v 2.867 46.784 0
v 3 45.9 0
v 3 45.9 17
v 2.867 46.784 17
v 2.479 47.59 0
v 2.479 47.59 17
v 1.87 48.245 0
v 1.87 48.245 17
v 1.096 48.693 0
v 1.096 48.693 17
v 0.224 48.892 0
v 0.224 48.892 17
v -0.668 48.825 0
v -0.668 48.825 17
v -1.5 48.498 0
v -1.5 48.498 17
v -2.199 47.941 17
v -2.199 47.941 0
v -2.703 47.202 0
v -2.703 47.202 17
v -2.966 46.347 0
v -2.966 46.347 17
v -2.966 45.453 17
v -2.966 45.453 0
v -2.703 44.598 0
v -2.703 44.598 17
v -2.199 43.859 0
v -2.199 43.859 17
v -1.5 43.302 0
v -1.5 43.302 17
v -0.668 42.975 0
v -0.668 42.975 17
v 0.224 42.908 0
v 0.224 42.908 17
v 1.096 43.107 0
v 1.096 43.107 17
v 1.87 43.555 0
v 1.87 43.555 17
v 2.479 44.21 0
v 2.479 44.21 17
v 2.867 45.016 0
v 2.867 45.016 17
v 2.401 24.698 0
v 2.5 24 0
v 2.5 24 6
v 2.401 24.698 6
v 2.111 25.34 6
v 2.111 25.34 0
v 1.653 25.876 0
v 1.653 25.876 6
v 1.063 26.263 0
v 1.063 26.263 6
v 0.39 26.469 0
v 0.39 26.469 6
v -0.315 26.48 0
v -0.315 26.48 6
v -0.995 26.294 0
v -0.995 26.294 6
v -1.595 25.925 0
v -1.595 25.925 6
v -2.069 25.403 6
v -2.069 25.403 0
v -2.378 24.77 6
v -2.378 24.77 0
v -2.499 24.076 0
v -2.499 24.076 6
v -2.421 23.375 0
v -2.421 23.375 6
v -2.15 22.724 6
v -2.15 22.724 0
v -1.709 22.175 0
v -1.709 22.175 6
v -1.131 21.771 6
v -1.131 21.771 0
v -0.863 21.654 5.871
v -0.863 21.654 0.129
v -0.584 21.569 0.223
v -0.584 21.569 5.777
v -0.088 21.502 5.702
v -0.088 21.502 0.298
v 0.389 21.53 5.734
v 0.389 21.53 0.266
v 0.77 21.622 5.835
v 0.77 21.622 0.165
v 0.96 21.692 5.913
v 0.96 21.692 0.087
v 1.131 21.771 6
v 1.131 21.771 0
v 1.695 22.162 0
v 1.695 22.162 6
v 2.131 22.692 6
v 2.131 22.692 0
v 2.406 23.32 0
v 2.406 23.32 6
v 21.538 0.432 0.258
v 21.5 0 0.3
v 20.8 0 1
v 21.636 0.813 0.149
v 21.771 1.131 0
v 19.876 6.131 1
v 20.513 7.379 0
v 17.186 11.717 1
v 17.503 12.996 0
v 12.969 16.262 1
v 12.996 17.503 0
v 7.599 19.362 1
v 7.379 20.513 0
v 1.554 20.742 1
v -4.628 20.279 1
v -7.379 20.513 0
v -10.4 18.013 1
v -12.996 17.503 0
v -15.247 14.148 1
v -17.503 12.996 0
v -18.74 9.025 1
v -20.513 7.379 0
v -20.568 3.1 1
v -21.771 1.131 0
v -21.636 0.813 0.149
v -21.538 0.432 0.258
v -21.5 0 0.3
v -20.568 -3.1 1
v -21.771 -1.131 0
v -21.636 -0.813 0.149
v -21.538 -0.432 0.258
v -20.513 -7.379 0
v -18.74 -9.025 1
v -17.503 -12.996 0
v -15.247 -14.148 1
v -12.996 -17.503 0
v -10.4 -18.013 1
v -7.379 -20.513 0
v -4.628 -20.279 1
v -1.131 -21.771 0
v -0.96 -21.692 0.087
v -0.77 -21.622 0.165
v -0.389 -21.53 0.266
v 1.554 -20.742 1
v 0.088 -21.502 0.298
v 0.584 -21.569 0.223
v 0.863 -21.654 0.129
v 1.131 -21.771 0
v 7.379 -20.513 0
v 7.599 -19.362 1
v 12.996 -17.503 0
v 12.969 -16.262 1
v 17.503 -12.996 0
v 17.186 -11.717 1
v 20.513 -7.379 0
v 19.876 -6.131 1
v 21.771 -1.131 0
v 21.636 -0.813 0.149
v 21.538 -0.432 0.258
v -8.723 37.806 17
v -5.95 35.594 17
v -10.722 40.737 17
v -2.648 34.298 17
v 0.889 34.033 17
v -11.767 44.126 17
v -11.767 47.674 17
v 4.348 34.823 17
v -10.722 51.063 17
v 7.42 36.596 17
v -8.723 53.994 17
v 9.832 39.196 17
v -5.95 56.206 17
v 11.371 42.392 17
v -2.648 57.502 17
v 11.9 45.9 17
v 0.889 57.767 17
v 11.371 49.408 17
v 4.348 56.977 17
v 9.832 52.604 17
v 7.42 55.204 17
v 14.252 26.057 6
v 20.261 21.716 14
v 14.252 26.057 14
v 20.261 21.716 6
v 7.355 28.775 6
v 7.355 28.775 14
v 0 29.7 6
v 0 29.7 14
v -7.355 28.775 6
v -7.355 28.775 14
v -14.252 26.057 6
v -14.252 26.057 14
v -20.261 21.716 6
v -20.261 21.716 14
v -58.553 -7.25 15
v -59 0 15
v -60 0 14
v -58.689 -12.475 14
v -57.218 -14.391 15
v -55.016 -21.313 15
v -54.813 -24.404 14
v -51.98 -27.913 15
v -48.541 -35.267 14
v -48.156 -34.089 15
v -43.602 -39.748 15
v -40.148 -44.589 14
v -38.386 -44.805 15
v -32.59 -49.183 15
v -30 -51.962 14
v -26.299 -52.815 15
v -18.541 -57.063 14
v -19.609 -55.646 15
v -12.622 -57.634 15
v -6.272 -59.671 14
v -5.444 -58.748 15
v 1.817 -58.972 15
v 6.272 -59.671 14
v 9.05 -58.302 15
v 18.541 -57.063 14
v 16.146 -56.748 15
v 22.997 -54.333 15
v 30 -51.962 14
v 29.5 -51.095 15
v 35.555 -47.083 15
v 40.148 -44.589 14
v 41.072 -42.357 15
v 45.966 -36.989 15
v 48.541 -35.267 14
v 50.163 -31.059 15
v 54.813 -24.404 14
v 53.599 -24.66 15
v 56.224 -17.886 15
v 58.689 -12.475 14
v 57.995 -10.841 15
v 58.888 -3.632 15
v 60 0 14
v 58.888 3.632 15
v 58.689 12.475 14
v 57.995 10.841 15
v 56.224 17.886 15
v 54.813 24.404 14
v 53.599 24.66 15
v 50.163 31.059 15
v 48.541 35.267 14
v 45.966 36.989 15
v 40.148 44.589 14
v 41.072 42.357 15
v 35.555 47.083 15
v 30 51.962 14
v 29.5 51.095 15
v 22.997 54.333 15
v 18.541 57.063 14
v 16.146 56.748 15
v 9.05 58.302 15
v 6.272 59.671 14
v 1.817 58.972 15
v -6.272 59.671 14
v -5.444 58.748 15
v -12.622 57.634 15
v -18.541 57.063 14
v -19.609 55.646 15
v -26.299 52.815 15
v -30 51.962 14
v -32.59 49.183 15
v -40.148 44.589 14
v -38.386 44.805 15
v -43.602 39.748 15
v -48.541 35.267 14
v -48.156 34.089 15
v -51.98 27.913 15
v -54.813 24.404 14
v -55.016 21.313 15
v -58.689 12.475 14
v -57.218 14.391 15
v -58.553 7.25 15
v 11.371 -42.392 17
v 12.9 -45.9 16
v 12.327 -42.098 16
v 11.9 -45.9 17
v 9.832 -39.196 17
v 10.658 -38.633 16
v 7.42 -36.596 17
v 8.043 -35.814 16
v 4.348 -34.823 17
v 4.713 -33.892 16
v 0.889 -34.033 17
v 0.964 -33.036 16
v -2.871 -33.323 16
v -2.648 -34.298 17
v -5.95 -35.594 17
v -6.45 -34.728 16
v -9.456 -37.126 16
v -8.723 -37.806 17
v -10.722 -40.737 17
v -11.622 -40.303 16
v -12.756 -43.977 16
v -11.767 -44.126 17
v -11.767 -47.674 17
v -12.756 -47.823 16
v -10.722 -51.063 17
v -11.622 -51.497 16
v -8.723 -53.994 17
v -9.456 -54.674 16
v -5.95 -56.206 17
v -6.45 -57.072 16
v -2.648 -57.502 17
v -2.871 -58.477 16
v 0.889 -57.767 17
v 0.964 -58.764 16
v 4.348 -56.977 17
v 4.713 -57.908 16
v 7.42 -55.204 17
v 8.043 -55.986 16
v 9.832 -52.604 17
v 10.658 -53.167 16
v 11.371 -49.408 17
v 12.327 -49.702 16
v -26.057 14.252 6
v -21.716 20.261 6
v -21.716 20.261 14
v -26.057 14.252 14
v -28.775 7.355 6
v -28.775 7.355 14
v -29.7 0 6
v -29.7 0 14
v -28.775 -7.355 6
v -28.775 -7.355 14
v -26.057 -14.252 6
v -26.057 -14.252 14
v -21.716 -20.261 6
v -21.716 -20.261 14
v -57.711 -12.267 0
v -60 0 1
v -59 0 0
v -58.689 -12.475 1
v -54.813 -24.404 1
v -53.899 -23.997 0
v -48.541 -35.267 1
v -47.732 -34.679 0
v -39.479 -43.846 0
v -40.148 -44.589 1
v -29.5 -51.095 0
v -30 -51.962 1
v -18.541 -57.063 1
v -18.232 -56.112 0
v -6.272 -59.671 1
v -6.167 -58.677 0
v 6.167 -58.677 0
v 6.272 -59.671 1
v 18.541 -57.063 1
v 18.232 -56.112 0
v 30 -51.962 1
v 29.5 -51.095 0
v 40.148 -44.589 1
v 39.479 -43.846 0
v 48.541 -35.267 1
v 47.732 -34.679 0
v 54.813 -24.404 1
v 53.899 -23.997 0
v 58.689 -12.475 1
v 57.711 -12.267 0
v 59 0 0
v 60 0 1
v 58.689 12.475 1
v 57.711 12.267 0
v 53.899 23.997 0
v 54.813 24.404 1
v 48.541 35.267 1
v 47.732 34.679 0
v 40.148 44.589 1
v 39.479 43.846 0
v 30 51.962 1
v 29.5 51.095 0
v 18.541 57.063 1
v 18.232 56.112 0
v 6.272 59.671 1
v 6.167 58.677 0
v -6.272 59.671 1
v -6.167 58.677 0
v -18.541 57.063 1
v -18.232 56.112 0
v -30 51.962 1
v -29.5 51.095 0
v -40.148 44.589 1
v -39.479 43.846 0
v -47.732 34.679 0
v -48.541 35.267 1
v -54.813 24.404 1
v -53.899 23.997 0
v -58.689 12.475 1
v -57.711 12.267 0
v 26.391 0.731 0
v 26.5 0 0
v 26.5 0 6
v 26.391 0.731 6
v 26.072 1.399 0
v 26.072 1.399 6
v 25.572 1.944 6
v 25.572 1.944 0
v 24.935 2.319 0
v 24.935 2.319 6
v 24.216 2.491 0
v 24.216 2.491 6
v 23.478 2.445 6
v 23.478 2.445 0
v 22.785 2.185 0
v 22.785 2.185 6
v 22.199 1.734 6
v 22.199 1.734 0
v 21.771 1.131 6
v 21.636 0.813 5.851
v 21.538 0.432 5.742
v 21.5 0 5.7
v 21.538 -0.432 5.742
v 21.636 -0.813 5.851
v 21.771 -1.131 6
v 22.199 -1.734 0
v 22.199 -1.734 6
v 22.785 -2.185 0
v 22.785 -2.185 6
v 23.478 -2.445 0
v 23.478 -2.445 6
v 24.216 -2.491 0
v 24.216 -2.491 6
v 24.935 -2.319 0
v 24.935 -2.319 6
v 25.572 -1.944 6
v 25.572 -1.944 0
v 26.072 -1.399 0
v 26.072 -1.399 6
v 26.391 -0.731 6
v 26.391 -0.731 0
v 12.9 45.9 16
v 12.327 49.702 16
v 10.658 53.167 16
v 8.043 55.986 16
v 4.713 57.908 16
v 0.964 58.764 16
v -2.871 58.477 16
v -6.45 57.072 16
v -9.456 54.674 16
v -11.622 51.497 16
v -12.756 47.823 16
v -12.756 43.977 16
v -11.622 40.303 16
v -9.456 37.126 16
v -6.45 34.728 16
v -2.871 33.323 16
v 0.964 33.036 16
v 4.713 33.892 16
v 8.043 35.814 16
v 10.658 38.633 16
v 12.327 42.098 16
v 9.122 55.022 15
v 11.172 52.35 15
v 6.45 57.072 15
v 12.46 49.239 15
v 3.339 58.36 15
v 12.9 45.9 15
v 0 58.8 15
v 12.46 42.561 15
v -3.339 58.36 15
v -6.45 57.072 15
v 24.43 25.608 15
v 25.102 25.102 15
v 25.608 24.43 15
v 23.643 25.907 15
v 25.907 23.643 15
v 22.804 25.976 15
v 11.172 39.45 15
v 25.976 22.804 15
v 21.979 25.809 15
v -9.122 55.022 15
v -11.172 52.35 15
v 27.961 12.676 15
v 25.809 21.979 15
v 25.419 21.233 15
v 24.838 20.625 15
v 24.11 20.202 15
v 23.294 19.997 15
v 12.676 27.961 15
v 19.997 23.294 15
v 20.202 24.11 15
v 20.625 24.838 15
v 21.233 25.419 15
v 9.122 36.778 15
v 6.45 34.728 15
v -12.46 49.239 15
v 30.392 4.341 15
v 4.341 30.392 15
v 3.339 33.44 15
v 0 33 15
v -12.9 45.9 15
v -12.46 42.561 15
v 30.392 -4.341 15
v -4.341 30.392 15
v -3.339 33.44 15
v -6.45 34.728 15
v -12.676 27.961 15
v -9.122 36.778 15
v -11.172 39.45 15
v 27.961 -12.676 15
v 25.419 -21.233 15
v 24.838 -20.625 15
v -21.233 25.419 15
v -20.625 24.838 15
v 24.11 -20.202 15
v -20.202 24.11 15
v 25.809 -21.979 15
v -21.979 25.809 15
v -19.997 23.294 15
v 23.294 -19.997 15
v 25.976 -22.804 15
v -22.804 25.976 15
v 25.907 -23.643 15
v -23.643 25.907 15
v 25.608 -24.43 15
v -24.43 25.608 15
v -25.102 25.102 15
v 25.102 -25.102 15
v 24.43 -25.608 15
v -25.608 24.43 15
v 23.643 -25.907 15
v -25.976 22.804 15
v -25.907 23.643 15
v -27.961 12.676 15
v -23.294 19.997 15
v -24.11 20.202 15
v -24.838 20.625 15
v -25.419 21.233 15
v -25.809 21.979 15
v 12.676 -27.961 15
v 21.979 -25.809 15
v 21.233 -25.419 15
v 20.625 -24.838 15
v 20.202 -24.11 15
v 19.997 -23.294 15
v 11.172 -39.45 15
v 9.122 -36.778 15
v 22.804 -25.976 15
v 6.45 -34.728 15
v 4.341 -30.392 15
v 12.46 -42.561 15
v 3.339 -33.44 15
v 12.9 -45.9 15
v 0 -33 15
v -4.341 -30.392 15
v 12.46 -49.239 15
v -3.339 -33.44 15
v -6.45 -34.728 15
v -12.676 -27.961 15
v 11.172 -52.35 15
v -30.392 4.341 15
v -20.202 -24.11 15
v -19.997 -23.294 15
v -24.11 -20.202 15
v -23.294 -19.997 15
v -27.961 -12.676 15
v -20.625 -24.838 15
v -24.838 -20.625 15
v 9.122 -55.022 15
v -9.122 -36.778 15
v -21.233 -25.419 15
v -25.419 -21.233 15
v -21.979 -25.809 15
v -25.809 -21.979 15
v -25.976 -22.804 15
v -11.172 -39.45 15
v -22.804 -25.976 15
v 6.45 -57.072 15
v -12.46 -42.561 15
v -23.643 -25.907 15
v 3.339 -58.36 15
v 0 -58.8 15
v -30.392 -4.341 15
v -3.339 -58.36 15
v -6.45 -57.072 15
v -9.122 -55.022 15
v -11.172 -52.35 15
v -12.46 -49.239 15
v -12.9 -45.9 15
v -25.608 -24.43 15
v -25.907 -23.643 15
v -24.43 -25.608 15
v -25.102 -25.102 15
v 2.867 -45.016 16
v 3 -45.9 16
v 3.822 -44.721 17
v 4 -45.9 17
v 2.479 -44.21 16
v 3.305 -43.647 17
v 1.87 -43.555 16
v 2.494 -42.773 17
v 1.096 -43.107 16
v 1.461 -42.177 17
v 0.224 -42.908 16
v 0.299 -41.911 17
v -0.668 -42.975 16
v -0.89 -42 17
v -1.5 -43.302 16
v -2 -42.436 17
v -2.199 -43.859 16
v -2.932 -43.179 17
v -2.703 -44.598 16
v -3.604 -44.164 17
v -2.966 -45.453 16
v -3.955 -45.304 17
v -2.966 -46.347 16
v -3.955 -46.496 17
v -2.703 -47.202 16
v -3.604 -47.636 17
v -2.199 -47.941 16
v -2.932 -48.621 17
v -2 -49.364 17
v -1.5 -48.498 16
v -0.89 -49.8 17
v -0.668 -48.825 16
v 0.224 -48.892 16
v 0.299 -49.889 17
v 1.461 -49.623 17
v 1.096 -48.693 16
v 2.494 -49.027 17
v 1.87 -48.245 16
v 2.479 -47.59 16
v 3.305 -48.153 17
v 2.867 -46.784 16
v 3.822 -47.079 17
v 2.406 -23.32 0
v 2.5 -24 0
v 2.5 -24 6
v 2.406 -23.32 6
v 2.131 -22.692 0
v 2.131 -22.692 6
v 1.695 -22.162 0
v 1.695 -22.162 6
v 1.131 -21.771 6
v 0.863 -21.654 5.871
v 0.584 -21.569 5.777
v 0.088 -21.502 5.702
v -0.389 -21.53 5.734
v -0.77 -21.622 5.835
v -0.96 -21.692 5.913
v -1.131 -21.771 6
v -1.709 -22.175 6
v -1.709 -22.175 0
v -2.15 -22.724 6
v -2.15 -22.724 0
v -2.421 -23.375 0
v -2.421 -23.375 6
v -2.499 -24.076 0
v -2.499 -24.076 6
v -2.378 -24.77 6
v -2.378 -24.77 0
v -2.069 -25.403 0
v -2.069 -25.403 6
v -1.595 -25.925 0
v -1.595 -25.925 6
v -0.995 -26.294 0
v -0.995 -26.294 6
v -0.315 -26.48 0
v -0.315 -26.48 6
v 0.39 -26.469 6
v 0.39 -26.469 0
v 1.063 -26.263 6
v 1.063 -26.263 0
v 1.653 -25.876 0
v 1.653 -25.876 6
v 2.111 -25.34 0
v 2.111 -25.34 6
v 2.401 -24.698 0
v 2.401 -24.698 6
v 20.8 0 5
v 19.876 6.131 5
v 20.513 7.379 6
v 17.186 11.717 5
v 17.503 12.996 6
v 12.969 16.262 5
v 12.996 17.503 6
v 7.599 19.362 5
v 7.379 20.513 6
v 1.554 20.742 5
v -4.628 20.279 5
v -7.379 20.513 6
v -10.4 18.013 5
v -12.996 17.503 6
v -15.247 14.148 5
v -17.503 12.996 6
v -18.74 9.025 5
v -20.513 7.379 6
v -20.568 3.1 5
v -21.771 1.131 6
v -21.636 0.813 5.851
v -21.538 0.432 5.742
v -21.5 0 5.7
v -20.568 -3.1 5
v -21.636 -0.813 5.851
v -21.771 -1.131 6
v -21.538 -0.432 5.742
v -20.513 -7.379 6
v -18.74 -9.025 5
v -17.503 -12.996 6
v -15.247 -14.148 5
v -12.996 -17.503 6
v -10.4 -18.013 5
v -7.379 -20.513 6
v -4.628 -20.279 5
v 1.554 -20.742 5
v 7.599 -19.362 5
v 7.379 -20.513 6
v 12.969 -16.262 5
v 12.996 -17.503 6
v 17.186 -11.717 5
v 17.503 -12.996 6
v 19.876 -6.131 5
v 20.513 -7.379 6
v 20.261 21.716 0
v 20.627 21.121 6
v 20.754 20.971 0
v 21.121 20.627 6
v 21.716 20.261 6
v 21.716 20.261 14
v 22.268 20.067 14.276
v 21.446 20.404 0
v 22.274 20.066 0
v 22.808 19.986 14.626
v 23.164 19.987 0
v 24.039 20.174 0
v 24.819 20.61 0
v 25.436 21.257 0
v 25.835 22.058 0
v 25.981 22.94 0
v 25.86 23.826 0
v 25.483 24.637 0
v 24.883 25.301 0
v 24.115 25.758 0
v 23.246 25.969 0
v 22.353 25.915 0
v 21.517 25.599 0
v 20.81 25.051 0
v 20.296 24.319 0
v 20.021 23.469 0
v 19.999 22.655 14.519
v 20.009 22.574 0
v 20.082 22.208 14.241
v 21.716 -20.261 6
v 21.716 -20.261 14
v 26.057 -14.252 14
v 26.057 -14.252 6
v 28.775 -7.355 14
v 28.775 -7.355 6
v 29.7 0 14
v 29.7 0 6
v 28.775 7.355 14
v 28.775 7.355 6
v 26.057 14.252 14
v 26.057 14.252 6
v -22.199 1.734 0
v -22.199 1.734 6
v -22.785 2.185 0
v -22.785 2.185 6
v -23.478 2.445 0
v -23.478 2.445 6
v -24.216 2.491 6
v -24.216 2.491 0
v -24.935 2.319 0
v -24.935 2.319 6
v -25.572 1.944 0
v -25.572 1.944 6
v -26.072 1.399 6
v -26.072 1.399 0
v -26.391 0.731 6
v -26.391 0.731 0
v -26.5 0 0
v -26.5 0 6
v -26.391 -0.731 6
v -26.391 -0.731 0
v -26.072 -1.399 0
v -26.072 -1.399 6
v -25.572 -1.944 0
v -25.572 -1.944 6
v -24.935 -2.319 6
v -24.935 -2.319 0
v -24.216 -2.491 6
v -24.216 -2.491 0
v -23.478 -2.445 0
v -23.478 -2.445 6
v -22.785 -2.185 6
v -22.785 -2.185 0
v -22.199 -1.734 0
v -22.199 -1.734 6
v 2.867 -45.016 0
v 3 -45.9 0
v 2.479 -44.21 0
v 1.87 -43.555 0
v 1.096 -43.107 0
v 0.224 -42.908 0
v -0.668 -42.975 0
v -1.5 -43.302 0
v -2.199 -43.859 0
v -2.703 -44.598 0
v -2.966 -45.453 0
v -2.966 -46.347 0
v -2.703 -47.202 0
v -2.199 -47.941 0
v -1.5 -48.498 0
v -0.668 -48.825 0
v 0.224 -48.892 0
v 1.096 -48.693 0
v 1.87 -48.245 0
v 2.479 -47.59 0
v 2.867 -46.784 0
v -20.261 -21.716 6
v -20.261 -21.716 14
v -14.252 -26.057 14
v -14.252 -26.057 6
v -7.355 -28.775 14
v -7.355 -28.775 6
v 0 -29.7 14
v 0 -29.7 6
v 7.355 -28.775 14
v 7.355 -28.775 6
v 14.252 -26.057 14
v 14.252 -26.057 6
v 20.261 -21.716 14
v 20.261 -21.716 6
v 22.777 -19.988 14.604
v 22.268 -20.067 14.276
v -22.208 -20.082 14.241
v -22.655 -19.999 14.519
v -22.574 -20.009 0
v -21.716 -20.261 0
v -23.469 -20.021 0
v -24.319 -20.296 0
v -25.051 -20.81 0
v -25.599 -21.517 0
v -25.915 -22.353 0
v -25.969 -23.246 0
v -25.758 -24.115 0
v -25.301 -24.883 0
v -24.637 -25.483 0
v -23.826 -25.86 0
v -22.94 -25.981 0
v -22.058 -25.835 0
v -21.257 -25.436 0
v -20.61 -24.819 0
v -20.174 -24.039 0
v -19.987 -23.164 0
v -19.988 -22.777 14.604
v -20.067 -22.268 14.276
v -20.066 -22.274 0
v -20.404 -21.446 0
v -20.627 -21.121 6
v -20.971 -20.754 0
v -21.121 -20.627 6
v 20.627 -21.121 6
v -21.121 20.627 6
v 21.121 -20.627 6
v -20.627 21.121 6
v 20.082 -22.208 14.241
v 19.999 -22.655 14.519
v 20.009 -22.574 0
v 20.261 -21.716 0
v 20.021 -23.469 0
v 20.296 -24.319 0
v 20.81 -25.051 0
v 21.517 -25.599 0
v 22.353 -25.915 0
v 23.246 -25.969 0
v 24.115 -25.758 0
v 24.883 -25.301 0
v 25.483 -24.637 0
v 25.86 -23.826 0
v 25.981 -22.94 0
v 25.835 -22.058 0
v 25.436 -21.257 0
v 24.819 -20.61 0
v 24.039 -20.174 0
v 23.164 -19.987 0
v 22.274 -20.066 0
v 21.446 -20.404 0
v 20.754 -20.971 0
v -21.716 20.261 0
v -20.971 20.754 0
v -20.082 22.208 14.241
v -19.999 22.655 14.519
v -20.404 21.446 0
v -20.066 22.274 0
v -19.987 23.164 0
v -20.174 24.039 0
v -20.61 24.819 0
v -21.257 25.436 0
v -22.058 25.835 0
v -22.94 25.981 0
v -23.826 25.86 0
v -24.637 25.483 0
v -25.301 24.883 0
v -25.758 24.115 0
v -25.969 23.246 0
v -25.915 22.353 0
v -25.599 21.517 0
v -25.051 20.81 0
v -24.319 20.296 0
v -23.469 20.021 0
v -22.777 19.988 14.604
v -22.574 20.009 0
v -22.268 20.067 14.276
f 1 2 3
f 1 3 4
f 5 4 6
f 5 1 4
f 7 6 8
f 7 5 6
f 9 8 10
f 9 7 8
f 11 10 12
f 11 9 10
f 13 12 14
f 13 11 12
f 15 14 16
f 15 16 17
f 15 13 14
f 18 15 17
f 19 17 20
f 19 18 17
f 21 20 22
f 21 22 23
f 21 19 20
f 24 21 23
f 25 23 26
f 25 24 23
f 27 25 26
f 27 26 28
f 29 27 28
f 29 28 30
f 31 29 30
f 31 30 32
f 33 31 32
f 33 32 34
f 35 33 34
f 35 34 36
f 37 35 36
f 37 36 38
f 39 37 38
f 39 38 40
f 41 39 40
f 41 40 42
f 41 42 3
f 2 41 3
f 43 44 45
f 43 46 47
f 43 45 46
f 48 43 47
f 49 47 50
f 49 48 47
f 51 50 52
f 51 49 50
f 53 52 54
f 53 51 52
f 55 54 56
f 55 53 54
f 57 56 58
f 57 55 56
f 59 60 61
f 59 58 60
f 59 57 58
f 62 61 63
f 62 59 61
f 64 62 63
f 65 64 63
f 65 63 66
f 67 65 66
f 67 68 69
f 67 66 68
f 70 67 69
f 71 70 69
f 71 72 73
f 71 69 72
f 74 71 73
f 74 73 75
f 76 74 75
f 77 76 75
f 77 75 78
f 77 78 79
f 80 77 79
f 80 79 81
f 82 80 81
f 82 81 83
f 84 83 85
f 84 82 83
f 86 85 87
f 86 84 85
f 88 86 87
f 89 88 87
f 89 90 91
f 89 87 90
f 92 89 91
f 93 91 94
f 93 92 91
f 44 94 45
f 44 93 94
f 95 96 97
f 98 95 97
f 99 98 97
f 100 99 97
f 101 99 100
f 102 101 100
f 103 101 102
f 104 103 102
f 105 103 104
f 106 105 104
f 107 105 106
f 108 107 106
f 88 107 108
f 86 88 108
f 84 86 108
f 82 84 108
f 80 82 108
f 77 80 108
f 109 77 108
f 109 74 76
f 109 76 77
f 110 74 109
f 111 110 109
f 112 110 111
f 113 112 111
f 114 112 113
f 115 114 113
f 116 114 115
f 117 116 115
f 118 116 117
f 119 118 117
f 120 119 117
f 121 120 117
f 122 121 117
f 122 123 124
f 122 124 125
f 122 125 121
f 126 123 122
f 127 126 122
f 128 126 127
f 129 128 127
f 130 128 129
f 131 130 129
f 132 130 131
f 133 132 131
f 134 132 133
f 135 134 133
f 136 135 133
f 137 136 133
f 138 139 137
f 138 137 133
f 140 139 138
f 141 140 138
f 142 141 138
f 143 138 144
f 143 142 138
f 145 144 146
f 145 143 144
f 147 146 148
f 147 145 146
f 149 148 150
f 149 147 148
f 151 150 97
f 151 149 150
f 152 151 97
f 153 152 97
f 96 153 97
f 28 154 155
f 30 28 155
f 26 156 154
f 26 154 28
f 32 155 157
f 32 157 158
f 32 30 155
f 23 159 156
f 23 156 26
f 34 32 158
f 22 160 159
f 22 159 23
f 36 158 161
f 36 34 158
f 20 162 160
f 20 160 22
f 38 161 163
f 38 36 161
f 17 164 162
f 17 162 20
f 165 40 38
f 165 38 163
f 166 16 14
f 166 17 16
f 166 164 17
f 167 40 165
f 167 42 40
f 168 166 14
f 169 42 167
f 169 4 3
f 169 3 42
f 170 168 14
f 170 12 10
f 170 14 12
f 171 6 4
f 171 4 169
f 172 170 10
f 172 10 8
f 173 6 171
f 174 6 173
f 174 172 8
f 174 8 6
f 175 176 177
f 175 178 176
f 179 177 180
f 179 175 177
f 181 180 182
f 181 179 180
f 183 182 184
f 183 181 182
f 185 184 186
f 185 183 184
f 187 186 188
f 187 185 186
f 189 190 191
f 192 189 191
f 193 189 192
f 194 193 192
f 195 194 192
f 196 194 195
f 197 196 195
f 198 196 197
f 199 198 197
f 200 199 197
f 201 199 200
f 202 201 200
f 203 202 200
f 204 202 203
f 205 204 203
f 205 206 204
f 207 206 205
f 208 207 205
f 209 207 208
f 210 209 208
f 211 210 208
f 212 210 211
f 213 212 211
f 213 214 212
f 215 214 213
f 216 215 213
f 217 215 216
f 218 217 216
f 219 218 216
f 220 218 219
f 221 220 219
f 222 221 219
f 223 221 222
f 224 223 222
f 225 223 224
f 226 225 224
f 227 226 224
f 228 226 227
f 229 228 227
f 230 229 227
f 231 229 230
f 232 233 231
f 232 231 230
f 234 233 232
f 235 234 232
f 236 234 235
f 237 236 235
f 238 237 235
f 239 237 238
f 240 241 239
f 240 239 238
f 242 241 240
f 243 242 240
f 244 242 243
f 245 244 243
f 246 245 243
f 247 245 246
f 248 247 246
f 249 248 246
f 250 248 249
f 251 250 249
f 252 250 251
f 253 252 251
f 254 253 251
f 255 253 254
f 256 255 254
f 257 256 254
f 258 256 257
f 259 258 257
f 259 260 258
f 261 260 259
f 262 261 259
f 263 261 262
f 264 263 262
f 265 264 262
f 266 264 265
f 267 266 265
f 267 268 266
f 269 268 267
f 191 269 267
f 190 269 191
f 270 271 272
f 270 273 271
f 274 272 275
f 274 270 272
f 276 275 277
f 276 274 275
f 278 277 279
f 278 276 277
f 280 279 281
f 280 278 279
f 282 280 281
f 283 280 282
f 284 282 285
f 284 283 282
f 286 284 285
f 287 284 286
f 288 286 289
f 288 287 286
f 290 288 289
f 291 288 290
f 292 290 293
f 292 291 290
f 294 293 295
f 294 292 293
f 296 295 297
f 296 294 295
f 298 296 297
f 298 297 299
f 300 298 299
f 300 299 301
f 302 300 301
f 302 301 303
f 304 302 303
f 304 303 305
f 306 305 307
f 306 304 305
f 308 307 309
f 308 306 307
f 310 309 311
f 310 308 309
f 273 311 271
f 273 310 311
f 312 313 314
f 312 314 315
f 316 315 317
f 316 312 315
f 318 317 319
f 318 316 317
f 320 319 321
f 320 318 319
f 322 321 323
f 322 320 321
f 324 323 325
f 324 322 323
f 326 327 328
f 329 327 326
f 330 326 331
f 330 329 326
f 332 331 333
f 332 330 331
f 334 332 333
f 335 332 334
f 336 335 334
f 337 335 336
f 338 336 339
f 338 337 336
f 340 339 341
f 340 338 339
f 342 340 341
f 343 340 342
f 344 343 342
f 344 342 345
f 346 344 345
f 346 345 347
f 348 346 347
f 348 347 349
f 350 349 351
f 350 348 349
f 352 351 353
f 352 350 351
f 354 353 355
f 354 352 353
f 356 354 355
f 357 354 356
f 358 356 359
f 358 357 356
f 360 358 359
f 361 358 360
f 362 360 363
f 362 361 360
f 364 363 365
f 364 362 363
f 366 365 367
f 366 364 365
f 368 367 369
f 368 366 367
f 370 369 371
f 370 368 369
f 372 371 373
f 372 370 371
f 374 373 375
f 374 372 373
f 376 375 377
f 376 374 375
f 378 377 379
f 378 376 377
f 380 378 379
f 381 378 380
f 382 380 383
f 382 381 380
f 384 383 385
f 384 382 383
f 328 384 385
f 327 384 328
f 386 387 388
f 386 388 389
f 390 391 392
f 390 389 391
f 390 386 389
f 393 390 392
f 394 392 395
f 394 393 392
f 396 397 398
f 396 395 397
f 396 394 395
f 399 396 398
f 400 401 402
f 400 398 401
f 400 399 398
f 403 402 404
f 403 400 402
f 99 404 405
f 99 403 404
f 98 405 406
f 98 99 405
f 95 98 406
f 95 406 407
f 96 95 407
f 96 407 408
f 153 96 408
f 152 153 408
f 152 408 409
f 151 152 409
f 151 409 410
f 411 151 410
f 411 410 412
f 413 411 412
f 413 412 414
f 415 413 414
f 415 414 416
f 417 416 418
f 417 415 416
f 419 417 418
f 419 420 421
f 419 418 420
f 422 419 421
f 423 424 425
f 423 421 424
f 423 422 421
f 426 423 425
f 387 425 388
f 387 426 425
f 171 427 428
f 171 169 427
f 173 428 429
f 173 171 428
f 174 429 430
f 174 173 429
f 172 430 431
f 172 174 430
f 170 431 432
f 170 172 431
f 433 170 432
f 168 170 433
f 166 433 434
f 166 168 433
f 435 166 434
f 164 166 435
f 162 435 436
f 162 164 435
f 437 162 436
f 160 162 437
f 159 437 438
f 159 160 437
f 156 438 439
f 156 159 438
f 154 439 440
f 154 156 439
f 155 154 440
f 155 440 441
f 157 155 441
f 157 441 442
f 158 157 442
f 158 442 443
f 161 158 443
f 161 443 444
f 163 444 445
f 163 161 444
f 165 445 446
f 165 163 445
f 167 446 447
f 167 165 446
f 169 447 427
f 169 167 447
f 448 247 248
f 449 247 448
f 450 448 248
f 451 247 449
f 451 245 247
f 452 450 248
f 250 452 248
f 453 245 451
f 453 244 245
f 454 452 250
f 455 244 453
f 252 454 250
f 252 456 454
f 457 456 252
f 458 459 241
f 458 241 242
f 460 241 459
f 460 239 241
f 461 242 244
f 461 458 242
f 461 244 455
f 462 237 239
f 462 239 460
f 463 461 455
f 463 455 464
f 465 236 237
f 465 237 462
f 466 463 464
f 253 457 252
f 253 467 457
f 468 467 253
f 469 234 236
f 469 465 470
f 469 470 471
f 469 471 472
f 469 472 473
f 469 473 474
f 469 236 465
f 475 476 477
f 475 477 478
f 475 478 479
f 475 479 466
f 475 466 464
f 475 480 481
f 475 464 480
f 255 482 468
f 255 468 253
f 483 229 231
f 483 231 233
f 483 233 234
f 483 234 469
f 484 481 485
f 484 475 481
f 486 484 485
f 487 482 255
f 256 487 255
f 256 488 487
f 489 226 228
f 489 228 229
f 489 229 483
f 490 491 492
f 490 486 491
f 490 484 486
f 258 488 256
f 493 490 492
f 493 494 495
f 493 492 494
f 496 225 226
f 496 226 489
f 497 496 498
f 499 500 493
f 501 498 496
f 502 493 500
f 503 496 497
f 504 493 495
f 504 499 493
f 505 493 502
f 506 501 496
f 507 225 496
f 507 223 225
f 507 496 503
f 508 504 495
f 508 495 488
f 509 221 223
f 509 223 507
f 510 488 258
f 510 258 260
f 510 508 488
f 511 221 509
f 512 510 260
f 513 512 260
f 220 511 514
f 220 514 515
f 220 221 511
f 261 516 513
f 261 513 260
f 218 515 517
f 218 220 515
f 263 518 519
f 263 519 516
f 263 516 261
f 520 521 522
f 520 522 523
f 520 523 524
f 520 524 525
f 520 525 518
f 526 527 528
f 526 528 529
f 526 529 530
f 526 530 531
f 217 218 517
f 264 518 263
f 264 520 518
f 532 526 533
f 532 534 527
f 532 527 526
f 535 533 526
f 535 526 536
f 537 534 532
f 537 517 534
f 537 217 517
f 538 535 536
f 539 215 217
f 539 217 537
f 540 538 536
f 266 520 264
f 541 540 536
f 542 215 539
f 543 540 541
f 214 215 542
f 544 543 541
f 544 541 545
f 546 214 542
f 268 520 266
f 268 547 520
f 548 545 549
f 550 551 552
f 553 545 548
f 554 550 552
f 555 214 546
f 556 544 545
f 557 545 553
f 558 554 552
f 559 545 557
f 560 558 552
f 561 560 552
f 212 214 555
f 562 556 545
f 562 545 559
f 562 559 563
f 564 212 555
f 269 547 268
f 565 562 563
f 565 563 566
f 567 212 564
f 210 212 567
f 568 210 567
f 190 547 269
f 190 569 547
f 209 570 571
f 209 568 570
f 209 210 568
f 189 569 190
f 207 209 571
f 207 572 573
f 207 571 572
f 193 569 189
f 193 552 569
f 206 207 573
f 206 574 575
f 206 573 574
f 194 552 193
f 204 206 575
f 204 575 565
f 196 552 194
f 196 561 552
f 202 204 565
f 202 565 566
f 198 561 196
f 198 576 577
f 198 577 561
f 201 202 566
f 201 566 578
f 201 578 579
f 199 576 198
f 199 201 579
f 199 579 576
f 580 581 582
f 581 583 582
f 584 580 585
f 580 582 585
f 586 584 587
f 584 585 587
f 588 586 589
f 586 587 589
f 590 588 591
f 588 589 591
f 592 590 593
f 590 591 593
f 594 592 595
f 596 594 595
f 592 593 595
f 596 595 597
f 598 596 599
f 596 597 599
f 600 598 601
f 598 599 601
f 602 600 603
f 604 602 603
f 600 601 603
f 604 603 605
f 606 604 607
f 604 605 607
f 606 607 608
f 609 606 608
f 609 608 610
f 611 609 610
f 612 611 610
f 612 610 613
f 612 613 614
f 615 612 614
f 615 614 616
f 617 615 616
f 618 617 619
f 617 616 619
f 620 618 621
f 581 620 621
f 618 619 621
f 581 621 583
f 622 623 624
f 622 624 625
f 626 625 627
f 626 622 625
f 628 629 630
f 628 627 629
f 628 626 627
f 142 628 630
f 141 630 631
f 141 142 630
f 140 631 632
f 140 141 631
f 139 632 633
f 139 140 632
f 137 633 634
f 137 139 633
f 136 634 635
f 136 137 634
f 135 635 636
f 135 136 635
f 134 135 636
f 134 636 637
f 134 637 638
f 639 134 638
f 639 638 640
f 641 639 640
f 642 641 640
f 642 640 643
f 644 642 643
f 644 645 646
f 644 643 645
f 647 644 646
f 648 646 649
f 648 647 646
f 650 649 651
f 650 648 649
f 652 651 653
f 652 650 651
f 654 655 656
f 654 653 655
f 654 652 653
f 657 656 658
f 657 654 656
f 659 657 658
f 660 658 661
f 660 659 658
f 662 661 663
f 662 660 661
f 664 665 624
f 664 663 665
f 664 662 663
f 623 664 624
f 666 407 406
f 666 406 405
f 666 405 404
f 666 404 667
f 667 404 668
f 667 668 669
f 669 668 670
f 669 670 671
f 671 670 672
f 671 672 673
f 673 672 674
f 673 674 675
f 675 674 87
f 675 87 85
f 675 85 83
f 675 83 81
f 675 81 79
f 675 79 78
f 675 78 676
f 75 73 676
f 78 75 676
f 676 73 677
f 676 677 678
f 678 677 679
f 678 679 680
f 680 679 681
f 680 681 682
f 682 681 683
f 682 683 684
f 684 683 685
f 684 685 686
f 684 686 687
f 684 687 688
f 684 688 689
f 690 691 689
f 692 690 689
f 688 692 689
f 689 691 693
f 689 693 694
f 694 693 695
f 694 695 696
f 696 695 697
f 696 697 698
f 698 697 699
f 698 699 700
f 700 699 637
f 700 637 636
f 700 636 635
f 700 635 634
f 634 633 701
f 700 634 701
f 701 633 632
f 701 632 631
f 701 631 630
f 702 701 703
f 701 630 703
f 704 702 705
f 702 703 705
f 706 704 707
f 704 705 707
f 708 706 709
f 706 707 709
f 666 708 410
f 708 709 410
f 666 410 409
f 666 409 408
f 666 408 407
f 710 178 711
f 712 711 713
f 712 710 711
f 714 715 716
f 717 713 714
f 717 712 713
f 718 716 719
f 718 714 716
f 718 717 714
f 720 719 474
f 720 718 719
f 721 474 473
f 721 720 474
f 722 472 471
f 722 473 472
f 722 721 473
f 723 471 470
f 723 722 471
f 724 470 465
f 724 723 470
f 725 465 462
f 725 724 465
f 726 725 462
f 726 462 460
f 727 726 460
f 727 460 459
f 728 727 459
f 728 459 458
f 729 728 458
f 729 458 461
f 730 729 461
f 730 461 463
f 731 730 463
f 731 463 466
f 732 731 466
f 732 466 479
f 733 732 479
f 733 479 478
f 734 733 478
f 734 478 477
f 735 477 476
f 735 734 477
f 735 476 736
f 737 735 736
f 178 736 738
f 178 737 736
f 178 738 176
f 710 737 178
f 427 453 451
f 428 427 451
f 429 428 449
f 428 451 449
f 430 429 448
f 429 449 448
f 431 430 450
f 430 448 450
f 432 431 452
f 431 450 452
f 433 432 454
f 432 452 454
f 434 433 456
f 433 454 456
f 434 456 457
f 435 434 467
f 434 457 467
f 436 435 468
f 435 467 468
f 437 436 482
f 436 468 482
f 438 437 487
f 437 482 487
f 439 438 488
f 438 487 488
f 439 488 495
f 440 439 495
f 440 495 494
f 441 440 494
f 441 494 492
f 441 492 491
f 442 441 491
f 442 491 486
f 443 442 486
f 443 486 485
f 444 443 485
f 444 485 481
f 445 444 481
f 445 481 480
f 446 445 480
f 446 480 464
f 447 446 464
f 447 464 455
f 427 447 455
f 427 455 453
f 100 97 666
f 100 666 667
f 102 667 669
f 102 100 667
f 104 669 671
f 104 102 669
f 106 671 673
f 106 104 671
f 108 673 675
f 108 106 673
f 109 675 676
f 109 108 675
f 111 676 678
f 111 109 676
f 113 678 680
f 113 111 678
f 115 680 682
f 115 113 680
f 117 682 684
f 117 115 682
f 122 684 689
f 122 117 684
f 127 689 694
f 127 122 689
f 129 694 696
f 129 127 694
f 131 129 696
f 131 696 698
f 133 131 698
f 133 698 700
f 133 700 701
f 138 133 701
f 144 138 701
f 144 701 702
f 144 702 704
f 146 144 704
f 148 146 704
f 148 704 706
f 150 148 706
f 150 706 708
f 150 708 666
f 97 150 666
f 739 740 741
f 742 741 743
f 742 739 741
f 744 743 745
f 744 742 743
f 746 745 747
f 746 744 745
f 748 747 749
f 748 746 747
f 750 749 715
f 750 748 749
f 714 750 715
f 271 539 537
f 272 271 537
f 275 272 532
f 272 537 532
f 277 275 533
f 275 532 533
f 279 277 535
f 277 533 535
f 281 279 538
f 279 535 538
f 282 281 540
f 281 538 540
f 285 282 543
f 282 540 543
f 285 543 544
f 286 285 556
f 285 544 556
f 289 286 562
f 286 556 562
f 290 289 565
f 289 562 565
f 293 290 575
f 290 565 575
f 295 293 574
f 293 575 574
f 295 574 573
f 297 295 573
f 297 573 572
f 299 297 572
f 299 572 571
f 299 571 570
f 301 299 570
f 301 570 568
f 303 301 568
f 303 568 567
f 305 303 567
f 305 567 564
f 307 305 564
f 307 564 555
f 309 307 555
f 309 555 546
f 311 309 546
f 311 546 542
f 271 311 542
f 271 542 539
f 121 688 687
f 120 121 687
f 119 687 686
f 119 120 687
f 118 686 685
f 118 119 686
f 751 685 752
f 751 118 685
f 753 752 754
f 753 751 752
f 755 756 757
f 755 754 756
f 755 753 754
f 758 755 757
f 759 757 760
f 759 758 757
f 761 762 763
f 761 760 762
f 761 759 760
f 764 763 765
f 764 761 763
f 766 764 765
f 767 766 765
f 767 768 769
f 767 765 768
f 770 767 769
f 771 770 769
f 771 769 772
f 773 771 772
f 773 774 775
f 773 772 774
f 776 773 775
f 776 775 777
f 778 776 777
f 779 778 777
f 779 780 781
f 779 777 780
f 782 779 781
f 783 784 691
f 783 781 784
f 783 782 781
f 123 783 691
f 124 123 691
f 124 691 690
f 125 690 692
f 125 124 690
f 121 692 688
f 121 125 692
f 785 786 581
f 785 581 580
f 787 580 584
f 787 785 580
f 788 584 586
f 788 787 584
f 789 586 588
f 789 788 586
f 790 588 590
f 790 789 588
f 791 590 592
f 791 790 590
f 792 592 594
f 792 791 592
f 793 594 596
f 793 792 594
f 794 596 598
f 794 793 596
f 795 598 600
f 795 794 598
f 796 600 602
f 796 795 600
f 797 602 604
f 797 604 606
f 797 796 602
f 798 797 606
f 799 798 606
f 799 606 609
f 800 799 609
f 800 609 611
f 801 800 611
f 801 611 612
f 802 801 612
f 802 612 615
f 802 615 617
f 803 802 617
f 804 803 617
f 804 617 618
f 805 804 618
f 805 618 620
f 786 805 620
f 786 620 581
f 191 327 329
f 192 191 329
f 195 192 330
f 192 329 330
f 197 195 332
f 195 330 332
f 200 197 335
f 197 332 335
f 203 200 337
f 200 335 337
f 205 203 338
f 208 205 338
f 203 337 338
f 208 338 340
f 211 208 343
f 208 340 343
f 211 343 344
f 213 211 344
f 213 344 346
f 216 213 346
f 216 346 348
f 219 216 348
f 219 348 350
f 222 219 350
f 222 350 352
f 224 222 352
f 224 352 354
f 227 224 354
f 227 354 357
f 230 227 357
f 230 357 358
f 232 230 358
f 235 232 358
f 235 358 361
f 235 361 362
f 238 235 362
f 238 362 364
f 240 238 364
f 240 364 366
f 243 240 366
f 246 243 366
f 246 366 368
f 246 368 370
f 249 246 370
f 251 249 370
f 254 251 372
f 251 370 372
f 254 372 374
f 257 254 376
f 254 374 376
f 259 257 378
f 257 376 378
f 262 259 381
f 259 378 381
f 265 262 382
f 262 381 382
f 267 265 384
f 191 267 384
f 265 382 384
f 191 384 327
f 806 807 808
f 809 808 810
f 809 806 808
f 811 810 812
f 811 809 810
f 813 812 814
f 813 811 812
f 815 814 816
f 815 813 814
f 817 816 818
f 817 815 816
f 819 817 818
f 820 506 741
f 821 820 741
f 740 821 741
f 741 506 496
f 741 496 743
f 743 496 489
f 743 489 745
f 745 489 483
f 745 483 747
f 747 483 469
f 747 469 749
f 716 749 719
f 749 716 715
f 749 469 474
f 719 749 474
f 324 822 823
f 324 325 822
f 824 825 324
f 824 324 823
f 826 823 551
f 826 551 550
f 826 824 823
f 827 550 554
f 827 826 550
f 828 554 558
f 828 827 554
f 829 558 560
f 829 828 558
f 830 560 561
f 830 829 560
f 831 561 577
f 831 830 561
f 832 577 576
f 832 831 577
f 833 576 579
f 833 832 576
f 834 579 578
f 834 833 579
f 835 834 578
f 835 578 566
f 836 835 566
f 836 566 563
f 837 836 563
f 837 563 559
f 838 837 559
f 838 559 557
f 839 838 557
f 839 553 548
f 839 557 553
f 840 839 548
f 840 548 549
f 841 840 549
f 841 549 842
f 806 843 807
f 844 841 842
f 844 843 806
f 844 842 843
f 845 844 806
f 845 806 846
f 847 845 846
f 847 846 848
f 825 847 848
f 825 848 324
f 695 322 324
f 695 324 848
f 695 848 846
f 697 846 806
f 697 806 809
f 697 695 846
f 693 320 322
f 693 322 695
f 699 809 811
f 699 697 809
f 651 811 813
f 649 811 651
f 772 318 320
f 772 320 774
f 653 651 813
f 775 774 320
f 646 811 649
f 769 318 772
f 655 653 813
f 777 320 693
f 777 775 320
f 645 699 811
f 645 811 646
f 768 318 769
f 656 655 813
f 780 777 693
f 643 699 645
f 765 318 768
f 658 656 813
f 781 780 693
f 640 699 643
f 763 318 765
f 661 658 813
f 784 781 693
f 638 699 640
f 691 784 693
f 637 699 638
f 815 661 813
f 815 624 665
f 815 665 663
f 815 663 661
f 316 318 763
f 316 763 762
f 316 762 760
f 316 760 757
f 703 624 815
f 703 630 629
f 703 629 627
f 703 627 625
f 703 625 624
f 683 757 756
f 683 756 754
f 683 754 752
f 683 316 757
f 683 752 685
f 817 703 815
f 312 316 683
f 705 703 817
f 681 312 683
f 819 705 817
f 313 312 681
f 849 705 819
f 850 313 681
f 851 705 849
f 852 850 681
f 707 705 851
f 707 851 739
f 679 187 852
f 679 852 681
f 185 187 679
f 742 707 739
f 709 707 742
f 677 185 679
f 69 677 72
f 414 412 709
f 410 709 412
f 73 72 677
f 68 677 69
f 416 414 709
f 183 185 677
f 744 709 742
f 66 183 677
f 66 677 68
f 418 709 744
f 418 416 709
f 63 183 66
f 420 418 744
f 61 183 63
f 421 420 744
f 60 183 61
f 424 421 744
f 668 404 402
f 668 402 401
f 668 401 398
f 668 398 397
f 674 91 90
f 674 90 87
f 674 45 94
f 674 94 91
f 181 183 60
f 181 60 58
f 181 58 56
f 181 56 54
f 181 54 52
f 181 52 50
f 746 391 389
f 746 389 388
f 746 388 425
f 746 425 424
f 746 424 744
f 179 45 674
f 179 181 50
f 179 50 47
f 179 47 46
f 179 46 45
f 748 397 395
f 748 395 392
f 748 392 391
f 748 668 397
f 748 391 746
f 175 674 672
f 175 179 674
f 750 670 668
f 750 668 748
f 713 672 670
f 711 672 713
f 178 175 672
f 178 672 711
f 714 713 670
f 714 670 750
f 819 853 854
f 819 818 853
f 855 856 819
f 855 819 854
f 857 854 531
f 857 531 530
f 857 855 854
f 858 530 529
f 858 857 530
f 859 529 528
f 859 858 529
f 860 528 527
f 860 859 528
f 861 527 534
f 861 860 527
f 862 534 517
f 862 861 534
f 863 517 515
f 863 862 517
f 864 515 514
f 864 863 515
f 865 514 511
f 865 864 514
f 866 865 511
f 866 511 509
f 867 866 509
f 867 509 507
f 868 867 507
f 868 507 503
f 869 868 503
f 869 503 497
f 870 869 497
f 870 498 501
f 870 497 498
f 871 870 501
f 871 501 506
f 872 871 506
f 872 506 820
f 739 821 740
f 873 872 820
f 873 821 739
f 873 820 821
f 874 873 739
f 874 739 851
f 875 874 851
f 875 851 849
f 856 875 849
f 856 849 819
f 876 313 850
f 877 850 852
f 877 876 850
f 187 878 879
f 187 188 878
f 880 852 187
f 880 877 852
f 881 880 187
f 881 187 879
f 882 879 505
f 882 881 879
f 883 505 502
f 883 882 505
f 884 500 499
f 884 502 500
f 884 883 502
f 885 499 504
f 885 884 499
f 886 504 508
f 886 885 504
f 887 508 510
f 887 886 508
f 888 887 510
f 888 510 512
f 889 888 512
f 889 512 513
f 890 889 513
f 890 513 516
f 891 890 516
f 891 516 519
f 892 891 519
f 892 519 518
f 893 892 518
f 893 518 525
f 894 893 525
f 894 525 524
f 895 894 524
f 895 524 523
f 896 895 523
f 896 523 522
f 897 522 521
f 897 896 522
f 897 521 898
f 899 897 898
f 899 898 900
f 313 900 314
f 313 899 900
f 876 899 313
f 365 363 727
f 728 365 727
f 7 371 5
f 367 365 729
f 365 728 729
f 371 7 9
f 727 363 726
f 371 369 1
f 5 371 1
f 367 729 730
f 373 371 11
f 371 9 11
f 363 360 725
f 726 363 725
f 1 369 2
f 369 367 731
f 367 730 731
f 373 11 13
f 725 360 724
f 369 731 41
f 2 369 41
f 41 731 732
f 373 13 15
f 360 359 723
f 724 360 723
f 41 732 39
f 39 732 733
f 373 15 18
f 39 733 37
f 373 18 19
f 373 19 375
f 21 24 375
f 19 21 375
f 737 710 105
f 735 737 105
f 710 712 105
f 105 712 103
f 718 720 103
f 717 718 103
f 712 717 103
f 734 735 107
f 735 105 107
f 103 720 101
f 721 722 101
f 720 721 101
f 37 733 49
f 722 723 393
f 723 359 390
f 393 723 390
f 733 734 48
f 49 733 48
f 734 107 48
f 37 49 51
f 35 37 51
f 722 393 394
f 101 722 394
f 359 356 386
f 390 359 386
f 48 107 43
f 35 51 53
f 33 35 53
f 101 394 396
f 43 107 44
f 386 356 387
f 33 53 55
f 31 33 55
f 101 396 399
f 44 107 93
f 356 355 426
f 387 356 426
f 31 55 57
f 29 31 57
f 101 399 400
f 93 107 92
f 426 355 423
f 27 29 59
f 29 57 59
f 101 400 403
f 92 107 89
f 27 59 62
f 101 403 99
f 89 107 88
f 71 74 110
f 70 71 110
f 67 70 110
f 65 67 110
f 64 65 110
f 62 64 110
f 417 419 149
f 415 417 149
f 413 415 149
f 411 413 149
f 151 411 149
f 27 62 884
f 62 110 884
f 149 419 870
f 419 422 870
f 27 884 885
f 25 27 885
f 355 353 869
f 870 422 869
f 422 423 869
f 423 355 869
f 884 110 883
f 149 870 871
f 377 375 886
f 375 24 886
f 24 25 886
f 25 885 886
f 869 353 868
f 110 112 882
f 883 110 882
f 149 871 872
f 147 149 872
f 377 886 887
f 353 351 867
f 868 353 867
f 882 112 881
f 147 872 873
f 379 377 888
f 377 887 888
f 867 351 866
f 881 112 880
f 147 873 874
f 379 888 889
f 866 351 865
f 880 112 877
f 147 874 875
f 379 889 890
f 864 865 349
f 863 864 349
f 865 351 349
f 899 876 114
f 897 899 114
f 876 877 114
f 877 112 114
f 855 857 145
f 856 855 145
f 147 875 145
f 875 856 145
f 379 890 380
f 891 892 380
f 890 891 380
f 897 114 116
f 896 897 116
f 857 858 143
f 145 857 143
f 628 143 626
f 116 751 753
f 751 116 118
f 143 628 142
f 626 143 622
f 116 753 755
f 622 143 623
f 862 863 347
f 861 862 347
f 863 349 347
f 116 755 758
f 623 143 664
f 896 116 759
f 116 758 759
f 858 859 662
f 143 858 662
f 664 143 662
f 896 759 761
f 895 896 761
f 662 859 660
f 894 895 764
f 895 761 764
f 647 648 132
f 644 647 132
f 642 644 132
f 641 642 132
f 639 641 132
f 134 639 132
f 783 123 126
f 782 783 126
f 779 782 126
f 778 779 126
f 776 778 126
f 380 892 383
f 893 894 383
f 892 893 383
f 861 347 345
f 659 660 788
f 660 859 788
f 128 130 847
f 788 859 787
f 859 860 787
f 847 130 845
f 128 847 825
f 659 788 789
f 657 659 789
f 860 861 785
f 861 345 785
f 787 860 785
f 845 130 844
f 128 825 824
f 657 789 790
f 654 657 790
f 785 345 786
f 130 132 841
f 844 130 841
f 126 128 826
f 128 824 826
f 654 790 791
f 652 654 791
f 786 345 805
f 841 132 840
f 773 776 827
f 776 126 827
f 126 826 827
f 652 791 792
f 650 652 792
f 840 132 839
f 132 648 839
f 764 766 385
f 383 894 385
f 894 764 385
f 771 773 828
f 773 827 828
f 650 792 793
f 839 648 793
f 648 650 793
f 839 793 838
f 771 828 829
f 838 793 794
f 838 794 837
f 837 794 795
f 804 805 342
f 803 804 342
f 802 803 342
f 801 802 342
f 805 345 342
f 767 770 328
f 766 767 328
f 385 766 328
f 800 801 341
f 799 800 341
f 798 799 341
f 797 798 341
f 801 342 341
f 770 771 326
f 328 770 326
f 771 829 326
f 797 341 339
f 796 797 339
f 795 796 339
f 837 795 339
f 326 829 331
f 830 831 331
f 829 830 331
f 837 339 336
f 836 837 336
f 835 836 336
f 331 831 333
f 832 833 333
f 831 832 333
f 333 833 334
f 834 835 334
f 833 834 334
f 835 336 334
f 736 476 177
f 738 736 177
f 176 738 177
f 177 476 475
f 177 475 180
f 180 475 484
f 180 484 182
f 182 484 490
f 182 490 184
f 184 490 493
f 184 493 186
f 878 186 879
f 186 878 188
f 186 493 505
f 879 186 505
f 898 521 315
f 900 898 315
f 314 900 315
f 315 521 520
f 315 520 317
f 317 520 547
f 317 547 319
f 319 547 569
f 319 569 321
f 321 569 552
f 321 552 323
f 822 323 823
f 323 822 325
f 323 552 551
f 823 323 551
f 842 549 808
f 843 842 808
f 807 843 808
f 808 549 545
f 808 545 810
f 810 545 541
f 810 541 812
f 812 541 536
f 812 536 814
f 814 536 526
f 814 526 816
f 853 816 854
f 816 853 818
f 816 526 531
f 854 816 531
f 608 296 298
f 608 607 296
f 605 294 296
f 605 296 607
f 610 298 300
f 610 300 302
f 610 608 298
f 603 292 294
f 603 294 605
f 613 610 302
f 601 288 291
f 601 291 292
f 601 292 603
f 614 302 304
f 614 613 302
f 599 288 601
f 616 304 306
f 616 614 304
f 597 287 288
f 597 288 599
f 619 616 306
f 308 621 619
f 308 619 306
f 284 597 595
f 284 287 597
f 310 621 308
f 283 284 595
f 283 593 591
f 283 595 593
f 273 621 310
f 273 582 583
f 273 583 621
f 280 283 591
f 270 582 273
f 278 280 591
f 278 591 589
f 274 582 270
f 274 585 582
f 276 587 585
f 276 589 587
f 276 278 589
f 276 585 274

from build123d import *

# Parameters (mm, degrees)
SKETCH1_R               = 29.7
SKETCH1_R_2             = 20.8
BOSS_EXTRUDE1_DEPTH     = 6
SKETCH3_R               = 60
SKETCH3_R_2             = 29.7
BOSS_EXTRUDE2_DEPTH     = 15
CUT_EXTRUDE1_DEPTH      = 87.168439698
CUT_EXTRUDE1_DEPTH_BACK = 87.168439698
SKETCH4_R               = 3
CUT_EXTRUDE3_DEPTH      = 87.168439698
CUT_EXTRUDE3_DEPTH_BACK = 87.168439698
SKETCH2_R               = 2.5
SKETCH5_R               = 12.9
SKETCH5_R_2             = 3
BOSS_EXTRUDE3_DEPTH     = 2
CUT_EXTRUDE4_DEPTH      = 87.168439698
CUT_EXTRUDE4_DEPTH_BACK = 87.168439698
SKETCH5_2_R             = 3
CHAMFER1_SIZE           = 1


with BuildPart() as part:
    # Sketch1 → Boss-Extrude1 (new body)
    with BuildSketch(Plane.XY):
        Circle(SKETCH1_R)
        Circle(SKETCH1_R_2, mode=Mode.SUBTRACT)
    extrude(amount=BOSS_EXTRUDE1_DEPTH)

    # Sketch3 → Boss-Extrude2 (add)
    with BuildSketch(Plane.XY):
        with Locations(Location((0, 0, 0), (0, 0, 180))):
            Circle(SKETCH3_R)
        with Locations(Location((0, 0, 0), (0, 0, 180))):
            Circle(SKETCH3_R_2, mode=Mode.SUBTRACT)
    extrude(amount=BOSS_EXTRUDE2_DEPTH)

    # Sketch4 → Cut-Extrude1 (cut, two sides: drawn at the far end of the back side and taken through both)
    with BuildSketch(Plane.XY.offset(-CUT_EXTRUDE1_DEPTH_BACK)):
        with Locations(Location((-22.980970389, 22.980970389, 0), (0, 0, 294.931333751))):
            Circle(SKETCH4_R)
        with Locations(Location((22.980970389, 22.980970389, 0), (0, 0, 204.931333751))):
            Circle(SKETCH4_R)
        with Locations(Location((22.980970389, -22.980970389, 0), (0, 0, 155.068666249))):
            Circle(SKETCH4_R)
        with Locations(Location((-22.980970389, -22.980970389, 0), (0, 0, 65.068666249))):
            Circle(SKETCH4_R)
    extrude(amount=CUT_EXTRUDE1_DEPTH + CUT_EXTRUDE1_DEPTH_BACK, mode=Mode.SUBTRACT)

    # Sketch2 → Cut-Extrude3 (cut, two sides: drawn at the far end of the back side and taken through both)
    with BuildSketch(Plane.XY.offset(-CUT_EXTRUDE3_DEPTH_BACK)):
        with Locations((0, 24)):
            Circle(SKETCH2_R)
        with Locations((24, 0)):
            Circle(SKETCH2_R)
        with Locations((0, -24)):
            Circle(SKETCH2_R)
        with Locations((-24, 0)):
            Circle(SKETCH2_R)
    extrude(amount=CUT_EXTRUDE3_DEPTH + CUT_EXTRUDE3_DEPTH_BACK, mode=Mode.SUBTRACT)

    # Sketch5 → Boss-Extrude3 (add)
    # profile 1 of 2: a face of its own
    with BuildSketch(Plane.XY.offset(15)):
        with Locations((0, 45.9)):
            Circle(SKETCH5_R)
        with Locations((0, 45.9)):
            Circle(SKETCH5_R_2, mode=Mode.SUBTRACT)
    # profile 2 of 2: a face of its own
    with BuildSketch(Plane.XY.offset(15)):
        with Locations((0, -45.9)):
            Circle(SKETCH5_R)
        with Locations((0, -45.9)):
            Circle(SKETCH5_R_2, mode=Mode.SUBTRACT)
    extrude(amount=BOSS_EXTRUDE3_DEPTH)

    # Sketch5<2> → Cut-Extrude4 (cut, two sides: drawn at the far end of the back side and taken through both)
    with BuildSketch(Plane.XY.offset(15).offset(-CUT_EXTRUDE4_DEPTH_BACK)):
        with Locations((0, 45.9)):
            Circle(SKETCH5_2_R)
        with Locations((0, -45.9)):
            Circle(SKETCH5_2_R)
    extrude(amount=CUT_EXTRUDE4_DEPTH + CUT_EXTRUDE4_DEPTH_BACK, mode=Mode.SUBTRACT)

    # Chamfer1
    # the kernel refuses this chamfer: 1 mm, written as the material it takes off along each edge
    with BuildSketch(Plane(origin=(0, 0, 0), x_dir=(-1, 0, 0), z_dir=(0, 1, 0))) as chamfer1_piece_1:
        Polygon((60 - CHAMFER1_SIZE, 0), (60, CHAMFER1_SIZE), (60, 0), align=None)
    revolve(axis=Axis((0, 0, 0), (0, 0, 1)), mode=Mode.SUBTRACT)
    with BuildSketch(Plane(origin=(0, 0, 15), x_dir=(-1, 0, 0), z_dir=(0, 1, 0))) as chamfer1_piece_2:
        Polygon((60, -CHAMFER1_SIZE), (60 - CHAMFER1_SIZE, 0), (60, 0), align=None)
    revolve(axis=Axis((0, 0, 15), (0, 0, 1)), mode=Mode.SUBTRACT)
    with BuildSketch(Plane(origin=(0, 0, 15), x_dir=(0.742872020210988, 0.6694334631519742, 0), z_dir=(0.6694334631519742, -0.742872020210988, 0))) as chamfer1_piece_3:
        Polygon((29.7, -CHAMFER1_SIZE), (29.7 + CHAMFER1_SIZE, 0), (29.7, 0), align=None)
    revolve(axis=Axis((0, 0, 15), (0, 0, 1)), revolution_arc=95.953291469, mode=Mode.SUBTRACT)
    with BuildSketch(Plane(origin=(0, 0, 15), x_dir=(-0.6694334631519382, 0.7428720202110204, 0), z_dir=(0.7428720202110204, 0.6694334631519382, 0))) as chamfer1_piece_4:
        Polygon((29.7, -CHAMFER1_SIZE), (29.7 + CHAMFER1_SIZE, 0), (29.7, 0), align=None)
    revolve(axis=Axis((0, 0, 15), (0, 0, 1)), revolution_arc=95.953291469, mode=Mode.SUBTRACT)
    with BuildSketch(Plane(origin=(0, 0, 15), x_dir=(-0.7428720202113098, -0.6694334631516169, 0), z_dir=(-0.6694334631516169, 0.7428720202113098, 0))) as chamfer1_piece_5:
        Polygon((29.7, -CHAMFER1_SIZE), (29.7 + CHAMFER1_SIZE, 0), (29.7, 0), align=None)
    revolve(axis=Axis((0, 0, 15), (0, 0, 1)), revolution_arc=95.953291469, mode=Mode.SUBTRACT)
    with BuildSketch(Plane(origin=(0, 0, 15), x_dir=(0.6694334631516162, -0.7428720202113106, 0), z_dir=(-0.7428720202113106, -0.6694334631516162, 0))) as chamfer1_piece_6:
        Polygon((29.7, -CHAMFER1_SIZE), (29.7 + CHAMFER1_SIZE, 0), (29.7, 0), align=None)
    revolve(axis=Axis((0, 0, 15), (0, 0, 1)), revolution_arc=95.95329147, mode=Mode.SUBTRACT)
    with BuildSketch(Plane(origin=(0, 0, 0), x_dir=(1, 0, 0), z_dir=(0, -1, 0))) as chamfer1_piece_7:
        Polygon((20.8, CHAMFER1_SIZE), (20.8 + CHAMFER1_SIZE, 0), (20.8, 0), align=None)
    revolve(axis=Axis((0, 0, 0), (0, 0, 1)), mode=Mode.SUBTRACT)
    with BuildSketch(Plane(origin=(0, 0, 6), x_dir=(1, 0, 0), z_dir=(0, -1, 0))) as chamfer1_piece_8:
        Polygon((20.8, -CHAMFER1_SIZE), (20.8 + CHAMFER1_SIZE, 0), (20.8, 0), align=None)
    revolve(axis=Axis((0, 0, 6), (0, 0, 1)), mode=Mode.SUBTRACT)
    with BuildSketch(Plane(origin=(0, 45.9, 17), x_dir=(1, 0, 0), z_dir=(0, -1, 0))) as chamfer1_piece_9:
        Polygon((12.9, -CHAMFER1_SIZE), (12.9 - CHAMFER1_SIZE, 0), (12.9, 0), align=None)
    revolve(axis=Axis((0, 45.9, 17), (0, 0, 1)), mode=Mode.SUBTRACT)
    with BuildSketch(Plane(origin=(0, -45.9, 17), x_dir=(1, 0, 0), z_dir=(0, -1, 0))) as chamfer1_piece_10:
        Polygon((12.9, -CHAMFER1_SIZE), (12.9 - CHAMFER1_SIZE, 0), (12.9, 0), align=None)
    revolve(axis=Axis((0, -45.9, 17), (0, 0, 1)), mode=Mode.SUBTRACT)
    with BuildSketch(Plane(origin=(0, -45.9, 17), x_dir=(1, 0, 0), z_dir=(0, -1, 0))) as chamfer1_piece_11:
        Polygon((3, -CHAMFER1_SIZE), (3 + CHAMFER1_SIZE, 0), (3, 0), align=None)
    revolve(axis=Axis((0, -45.9, 17), (0, 0, 1)), mode=Mode.SUBTRACT)


solid = part.part
